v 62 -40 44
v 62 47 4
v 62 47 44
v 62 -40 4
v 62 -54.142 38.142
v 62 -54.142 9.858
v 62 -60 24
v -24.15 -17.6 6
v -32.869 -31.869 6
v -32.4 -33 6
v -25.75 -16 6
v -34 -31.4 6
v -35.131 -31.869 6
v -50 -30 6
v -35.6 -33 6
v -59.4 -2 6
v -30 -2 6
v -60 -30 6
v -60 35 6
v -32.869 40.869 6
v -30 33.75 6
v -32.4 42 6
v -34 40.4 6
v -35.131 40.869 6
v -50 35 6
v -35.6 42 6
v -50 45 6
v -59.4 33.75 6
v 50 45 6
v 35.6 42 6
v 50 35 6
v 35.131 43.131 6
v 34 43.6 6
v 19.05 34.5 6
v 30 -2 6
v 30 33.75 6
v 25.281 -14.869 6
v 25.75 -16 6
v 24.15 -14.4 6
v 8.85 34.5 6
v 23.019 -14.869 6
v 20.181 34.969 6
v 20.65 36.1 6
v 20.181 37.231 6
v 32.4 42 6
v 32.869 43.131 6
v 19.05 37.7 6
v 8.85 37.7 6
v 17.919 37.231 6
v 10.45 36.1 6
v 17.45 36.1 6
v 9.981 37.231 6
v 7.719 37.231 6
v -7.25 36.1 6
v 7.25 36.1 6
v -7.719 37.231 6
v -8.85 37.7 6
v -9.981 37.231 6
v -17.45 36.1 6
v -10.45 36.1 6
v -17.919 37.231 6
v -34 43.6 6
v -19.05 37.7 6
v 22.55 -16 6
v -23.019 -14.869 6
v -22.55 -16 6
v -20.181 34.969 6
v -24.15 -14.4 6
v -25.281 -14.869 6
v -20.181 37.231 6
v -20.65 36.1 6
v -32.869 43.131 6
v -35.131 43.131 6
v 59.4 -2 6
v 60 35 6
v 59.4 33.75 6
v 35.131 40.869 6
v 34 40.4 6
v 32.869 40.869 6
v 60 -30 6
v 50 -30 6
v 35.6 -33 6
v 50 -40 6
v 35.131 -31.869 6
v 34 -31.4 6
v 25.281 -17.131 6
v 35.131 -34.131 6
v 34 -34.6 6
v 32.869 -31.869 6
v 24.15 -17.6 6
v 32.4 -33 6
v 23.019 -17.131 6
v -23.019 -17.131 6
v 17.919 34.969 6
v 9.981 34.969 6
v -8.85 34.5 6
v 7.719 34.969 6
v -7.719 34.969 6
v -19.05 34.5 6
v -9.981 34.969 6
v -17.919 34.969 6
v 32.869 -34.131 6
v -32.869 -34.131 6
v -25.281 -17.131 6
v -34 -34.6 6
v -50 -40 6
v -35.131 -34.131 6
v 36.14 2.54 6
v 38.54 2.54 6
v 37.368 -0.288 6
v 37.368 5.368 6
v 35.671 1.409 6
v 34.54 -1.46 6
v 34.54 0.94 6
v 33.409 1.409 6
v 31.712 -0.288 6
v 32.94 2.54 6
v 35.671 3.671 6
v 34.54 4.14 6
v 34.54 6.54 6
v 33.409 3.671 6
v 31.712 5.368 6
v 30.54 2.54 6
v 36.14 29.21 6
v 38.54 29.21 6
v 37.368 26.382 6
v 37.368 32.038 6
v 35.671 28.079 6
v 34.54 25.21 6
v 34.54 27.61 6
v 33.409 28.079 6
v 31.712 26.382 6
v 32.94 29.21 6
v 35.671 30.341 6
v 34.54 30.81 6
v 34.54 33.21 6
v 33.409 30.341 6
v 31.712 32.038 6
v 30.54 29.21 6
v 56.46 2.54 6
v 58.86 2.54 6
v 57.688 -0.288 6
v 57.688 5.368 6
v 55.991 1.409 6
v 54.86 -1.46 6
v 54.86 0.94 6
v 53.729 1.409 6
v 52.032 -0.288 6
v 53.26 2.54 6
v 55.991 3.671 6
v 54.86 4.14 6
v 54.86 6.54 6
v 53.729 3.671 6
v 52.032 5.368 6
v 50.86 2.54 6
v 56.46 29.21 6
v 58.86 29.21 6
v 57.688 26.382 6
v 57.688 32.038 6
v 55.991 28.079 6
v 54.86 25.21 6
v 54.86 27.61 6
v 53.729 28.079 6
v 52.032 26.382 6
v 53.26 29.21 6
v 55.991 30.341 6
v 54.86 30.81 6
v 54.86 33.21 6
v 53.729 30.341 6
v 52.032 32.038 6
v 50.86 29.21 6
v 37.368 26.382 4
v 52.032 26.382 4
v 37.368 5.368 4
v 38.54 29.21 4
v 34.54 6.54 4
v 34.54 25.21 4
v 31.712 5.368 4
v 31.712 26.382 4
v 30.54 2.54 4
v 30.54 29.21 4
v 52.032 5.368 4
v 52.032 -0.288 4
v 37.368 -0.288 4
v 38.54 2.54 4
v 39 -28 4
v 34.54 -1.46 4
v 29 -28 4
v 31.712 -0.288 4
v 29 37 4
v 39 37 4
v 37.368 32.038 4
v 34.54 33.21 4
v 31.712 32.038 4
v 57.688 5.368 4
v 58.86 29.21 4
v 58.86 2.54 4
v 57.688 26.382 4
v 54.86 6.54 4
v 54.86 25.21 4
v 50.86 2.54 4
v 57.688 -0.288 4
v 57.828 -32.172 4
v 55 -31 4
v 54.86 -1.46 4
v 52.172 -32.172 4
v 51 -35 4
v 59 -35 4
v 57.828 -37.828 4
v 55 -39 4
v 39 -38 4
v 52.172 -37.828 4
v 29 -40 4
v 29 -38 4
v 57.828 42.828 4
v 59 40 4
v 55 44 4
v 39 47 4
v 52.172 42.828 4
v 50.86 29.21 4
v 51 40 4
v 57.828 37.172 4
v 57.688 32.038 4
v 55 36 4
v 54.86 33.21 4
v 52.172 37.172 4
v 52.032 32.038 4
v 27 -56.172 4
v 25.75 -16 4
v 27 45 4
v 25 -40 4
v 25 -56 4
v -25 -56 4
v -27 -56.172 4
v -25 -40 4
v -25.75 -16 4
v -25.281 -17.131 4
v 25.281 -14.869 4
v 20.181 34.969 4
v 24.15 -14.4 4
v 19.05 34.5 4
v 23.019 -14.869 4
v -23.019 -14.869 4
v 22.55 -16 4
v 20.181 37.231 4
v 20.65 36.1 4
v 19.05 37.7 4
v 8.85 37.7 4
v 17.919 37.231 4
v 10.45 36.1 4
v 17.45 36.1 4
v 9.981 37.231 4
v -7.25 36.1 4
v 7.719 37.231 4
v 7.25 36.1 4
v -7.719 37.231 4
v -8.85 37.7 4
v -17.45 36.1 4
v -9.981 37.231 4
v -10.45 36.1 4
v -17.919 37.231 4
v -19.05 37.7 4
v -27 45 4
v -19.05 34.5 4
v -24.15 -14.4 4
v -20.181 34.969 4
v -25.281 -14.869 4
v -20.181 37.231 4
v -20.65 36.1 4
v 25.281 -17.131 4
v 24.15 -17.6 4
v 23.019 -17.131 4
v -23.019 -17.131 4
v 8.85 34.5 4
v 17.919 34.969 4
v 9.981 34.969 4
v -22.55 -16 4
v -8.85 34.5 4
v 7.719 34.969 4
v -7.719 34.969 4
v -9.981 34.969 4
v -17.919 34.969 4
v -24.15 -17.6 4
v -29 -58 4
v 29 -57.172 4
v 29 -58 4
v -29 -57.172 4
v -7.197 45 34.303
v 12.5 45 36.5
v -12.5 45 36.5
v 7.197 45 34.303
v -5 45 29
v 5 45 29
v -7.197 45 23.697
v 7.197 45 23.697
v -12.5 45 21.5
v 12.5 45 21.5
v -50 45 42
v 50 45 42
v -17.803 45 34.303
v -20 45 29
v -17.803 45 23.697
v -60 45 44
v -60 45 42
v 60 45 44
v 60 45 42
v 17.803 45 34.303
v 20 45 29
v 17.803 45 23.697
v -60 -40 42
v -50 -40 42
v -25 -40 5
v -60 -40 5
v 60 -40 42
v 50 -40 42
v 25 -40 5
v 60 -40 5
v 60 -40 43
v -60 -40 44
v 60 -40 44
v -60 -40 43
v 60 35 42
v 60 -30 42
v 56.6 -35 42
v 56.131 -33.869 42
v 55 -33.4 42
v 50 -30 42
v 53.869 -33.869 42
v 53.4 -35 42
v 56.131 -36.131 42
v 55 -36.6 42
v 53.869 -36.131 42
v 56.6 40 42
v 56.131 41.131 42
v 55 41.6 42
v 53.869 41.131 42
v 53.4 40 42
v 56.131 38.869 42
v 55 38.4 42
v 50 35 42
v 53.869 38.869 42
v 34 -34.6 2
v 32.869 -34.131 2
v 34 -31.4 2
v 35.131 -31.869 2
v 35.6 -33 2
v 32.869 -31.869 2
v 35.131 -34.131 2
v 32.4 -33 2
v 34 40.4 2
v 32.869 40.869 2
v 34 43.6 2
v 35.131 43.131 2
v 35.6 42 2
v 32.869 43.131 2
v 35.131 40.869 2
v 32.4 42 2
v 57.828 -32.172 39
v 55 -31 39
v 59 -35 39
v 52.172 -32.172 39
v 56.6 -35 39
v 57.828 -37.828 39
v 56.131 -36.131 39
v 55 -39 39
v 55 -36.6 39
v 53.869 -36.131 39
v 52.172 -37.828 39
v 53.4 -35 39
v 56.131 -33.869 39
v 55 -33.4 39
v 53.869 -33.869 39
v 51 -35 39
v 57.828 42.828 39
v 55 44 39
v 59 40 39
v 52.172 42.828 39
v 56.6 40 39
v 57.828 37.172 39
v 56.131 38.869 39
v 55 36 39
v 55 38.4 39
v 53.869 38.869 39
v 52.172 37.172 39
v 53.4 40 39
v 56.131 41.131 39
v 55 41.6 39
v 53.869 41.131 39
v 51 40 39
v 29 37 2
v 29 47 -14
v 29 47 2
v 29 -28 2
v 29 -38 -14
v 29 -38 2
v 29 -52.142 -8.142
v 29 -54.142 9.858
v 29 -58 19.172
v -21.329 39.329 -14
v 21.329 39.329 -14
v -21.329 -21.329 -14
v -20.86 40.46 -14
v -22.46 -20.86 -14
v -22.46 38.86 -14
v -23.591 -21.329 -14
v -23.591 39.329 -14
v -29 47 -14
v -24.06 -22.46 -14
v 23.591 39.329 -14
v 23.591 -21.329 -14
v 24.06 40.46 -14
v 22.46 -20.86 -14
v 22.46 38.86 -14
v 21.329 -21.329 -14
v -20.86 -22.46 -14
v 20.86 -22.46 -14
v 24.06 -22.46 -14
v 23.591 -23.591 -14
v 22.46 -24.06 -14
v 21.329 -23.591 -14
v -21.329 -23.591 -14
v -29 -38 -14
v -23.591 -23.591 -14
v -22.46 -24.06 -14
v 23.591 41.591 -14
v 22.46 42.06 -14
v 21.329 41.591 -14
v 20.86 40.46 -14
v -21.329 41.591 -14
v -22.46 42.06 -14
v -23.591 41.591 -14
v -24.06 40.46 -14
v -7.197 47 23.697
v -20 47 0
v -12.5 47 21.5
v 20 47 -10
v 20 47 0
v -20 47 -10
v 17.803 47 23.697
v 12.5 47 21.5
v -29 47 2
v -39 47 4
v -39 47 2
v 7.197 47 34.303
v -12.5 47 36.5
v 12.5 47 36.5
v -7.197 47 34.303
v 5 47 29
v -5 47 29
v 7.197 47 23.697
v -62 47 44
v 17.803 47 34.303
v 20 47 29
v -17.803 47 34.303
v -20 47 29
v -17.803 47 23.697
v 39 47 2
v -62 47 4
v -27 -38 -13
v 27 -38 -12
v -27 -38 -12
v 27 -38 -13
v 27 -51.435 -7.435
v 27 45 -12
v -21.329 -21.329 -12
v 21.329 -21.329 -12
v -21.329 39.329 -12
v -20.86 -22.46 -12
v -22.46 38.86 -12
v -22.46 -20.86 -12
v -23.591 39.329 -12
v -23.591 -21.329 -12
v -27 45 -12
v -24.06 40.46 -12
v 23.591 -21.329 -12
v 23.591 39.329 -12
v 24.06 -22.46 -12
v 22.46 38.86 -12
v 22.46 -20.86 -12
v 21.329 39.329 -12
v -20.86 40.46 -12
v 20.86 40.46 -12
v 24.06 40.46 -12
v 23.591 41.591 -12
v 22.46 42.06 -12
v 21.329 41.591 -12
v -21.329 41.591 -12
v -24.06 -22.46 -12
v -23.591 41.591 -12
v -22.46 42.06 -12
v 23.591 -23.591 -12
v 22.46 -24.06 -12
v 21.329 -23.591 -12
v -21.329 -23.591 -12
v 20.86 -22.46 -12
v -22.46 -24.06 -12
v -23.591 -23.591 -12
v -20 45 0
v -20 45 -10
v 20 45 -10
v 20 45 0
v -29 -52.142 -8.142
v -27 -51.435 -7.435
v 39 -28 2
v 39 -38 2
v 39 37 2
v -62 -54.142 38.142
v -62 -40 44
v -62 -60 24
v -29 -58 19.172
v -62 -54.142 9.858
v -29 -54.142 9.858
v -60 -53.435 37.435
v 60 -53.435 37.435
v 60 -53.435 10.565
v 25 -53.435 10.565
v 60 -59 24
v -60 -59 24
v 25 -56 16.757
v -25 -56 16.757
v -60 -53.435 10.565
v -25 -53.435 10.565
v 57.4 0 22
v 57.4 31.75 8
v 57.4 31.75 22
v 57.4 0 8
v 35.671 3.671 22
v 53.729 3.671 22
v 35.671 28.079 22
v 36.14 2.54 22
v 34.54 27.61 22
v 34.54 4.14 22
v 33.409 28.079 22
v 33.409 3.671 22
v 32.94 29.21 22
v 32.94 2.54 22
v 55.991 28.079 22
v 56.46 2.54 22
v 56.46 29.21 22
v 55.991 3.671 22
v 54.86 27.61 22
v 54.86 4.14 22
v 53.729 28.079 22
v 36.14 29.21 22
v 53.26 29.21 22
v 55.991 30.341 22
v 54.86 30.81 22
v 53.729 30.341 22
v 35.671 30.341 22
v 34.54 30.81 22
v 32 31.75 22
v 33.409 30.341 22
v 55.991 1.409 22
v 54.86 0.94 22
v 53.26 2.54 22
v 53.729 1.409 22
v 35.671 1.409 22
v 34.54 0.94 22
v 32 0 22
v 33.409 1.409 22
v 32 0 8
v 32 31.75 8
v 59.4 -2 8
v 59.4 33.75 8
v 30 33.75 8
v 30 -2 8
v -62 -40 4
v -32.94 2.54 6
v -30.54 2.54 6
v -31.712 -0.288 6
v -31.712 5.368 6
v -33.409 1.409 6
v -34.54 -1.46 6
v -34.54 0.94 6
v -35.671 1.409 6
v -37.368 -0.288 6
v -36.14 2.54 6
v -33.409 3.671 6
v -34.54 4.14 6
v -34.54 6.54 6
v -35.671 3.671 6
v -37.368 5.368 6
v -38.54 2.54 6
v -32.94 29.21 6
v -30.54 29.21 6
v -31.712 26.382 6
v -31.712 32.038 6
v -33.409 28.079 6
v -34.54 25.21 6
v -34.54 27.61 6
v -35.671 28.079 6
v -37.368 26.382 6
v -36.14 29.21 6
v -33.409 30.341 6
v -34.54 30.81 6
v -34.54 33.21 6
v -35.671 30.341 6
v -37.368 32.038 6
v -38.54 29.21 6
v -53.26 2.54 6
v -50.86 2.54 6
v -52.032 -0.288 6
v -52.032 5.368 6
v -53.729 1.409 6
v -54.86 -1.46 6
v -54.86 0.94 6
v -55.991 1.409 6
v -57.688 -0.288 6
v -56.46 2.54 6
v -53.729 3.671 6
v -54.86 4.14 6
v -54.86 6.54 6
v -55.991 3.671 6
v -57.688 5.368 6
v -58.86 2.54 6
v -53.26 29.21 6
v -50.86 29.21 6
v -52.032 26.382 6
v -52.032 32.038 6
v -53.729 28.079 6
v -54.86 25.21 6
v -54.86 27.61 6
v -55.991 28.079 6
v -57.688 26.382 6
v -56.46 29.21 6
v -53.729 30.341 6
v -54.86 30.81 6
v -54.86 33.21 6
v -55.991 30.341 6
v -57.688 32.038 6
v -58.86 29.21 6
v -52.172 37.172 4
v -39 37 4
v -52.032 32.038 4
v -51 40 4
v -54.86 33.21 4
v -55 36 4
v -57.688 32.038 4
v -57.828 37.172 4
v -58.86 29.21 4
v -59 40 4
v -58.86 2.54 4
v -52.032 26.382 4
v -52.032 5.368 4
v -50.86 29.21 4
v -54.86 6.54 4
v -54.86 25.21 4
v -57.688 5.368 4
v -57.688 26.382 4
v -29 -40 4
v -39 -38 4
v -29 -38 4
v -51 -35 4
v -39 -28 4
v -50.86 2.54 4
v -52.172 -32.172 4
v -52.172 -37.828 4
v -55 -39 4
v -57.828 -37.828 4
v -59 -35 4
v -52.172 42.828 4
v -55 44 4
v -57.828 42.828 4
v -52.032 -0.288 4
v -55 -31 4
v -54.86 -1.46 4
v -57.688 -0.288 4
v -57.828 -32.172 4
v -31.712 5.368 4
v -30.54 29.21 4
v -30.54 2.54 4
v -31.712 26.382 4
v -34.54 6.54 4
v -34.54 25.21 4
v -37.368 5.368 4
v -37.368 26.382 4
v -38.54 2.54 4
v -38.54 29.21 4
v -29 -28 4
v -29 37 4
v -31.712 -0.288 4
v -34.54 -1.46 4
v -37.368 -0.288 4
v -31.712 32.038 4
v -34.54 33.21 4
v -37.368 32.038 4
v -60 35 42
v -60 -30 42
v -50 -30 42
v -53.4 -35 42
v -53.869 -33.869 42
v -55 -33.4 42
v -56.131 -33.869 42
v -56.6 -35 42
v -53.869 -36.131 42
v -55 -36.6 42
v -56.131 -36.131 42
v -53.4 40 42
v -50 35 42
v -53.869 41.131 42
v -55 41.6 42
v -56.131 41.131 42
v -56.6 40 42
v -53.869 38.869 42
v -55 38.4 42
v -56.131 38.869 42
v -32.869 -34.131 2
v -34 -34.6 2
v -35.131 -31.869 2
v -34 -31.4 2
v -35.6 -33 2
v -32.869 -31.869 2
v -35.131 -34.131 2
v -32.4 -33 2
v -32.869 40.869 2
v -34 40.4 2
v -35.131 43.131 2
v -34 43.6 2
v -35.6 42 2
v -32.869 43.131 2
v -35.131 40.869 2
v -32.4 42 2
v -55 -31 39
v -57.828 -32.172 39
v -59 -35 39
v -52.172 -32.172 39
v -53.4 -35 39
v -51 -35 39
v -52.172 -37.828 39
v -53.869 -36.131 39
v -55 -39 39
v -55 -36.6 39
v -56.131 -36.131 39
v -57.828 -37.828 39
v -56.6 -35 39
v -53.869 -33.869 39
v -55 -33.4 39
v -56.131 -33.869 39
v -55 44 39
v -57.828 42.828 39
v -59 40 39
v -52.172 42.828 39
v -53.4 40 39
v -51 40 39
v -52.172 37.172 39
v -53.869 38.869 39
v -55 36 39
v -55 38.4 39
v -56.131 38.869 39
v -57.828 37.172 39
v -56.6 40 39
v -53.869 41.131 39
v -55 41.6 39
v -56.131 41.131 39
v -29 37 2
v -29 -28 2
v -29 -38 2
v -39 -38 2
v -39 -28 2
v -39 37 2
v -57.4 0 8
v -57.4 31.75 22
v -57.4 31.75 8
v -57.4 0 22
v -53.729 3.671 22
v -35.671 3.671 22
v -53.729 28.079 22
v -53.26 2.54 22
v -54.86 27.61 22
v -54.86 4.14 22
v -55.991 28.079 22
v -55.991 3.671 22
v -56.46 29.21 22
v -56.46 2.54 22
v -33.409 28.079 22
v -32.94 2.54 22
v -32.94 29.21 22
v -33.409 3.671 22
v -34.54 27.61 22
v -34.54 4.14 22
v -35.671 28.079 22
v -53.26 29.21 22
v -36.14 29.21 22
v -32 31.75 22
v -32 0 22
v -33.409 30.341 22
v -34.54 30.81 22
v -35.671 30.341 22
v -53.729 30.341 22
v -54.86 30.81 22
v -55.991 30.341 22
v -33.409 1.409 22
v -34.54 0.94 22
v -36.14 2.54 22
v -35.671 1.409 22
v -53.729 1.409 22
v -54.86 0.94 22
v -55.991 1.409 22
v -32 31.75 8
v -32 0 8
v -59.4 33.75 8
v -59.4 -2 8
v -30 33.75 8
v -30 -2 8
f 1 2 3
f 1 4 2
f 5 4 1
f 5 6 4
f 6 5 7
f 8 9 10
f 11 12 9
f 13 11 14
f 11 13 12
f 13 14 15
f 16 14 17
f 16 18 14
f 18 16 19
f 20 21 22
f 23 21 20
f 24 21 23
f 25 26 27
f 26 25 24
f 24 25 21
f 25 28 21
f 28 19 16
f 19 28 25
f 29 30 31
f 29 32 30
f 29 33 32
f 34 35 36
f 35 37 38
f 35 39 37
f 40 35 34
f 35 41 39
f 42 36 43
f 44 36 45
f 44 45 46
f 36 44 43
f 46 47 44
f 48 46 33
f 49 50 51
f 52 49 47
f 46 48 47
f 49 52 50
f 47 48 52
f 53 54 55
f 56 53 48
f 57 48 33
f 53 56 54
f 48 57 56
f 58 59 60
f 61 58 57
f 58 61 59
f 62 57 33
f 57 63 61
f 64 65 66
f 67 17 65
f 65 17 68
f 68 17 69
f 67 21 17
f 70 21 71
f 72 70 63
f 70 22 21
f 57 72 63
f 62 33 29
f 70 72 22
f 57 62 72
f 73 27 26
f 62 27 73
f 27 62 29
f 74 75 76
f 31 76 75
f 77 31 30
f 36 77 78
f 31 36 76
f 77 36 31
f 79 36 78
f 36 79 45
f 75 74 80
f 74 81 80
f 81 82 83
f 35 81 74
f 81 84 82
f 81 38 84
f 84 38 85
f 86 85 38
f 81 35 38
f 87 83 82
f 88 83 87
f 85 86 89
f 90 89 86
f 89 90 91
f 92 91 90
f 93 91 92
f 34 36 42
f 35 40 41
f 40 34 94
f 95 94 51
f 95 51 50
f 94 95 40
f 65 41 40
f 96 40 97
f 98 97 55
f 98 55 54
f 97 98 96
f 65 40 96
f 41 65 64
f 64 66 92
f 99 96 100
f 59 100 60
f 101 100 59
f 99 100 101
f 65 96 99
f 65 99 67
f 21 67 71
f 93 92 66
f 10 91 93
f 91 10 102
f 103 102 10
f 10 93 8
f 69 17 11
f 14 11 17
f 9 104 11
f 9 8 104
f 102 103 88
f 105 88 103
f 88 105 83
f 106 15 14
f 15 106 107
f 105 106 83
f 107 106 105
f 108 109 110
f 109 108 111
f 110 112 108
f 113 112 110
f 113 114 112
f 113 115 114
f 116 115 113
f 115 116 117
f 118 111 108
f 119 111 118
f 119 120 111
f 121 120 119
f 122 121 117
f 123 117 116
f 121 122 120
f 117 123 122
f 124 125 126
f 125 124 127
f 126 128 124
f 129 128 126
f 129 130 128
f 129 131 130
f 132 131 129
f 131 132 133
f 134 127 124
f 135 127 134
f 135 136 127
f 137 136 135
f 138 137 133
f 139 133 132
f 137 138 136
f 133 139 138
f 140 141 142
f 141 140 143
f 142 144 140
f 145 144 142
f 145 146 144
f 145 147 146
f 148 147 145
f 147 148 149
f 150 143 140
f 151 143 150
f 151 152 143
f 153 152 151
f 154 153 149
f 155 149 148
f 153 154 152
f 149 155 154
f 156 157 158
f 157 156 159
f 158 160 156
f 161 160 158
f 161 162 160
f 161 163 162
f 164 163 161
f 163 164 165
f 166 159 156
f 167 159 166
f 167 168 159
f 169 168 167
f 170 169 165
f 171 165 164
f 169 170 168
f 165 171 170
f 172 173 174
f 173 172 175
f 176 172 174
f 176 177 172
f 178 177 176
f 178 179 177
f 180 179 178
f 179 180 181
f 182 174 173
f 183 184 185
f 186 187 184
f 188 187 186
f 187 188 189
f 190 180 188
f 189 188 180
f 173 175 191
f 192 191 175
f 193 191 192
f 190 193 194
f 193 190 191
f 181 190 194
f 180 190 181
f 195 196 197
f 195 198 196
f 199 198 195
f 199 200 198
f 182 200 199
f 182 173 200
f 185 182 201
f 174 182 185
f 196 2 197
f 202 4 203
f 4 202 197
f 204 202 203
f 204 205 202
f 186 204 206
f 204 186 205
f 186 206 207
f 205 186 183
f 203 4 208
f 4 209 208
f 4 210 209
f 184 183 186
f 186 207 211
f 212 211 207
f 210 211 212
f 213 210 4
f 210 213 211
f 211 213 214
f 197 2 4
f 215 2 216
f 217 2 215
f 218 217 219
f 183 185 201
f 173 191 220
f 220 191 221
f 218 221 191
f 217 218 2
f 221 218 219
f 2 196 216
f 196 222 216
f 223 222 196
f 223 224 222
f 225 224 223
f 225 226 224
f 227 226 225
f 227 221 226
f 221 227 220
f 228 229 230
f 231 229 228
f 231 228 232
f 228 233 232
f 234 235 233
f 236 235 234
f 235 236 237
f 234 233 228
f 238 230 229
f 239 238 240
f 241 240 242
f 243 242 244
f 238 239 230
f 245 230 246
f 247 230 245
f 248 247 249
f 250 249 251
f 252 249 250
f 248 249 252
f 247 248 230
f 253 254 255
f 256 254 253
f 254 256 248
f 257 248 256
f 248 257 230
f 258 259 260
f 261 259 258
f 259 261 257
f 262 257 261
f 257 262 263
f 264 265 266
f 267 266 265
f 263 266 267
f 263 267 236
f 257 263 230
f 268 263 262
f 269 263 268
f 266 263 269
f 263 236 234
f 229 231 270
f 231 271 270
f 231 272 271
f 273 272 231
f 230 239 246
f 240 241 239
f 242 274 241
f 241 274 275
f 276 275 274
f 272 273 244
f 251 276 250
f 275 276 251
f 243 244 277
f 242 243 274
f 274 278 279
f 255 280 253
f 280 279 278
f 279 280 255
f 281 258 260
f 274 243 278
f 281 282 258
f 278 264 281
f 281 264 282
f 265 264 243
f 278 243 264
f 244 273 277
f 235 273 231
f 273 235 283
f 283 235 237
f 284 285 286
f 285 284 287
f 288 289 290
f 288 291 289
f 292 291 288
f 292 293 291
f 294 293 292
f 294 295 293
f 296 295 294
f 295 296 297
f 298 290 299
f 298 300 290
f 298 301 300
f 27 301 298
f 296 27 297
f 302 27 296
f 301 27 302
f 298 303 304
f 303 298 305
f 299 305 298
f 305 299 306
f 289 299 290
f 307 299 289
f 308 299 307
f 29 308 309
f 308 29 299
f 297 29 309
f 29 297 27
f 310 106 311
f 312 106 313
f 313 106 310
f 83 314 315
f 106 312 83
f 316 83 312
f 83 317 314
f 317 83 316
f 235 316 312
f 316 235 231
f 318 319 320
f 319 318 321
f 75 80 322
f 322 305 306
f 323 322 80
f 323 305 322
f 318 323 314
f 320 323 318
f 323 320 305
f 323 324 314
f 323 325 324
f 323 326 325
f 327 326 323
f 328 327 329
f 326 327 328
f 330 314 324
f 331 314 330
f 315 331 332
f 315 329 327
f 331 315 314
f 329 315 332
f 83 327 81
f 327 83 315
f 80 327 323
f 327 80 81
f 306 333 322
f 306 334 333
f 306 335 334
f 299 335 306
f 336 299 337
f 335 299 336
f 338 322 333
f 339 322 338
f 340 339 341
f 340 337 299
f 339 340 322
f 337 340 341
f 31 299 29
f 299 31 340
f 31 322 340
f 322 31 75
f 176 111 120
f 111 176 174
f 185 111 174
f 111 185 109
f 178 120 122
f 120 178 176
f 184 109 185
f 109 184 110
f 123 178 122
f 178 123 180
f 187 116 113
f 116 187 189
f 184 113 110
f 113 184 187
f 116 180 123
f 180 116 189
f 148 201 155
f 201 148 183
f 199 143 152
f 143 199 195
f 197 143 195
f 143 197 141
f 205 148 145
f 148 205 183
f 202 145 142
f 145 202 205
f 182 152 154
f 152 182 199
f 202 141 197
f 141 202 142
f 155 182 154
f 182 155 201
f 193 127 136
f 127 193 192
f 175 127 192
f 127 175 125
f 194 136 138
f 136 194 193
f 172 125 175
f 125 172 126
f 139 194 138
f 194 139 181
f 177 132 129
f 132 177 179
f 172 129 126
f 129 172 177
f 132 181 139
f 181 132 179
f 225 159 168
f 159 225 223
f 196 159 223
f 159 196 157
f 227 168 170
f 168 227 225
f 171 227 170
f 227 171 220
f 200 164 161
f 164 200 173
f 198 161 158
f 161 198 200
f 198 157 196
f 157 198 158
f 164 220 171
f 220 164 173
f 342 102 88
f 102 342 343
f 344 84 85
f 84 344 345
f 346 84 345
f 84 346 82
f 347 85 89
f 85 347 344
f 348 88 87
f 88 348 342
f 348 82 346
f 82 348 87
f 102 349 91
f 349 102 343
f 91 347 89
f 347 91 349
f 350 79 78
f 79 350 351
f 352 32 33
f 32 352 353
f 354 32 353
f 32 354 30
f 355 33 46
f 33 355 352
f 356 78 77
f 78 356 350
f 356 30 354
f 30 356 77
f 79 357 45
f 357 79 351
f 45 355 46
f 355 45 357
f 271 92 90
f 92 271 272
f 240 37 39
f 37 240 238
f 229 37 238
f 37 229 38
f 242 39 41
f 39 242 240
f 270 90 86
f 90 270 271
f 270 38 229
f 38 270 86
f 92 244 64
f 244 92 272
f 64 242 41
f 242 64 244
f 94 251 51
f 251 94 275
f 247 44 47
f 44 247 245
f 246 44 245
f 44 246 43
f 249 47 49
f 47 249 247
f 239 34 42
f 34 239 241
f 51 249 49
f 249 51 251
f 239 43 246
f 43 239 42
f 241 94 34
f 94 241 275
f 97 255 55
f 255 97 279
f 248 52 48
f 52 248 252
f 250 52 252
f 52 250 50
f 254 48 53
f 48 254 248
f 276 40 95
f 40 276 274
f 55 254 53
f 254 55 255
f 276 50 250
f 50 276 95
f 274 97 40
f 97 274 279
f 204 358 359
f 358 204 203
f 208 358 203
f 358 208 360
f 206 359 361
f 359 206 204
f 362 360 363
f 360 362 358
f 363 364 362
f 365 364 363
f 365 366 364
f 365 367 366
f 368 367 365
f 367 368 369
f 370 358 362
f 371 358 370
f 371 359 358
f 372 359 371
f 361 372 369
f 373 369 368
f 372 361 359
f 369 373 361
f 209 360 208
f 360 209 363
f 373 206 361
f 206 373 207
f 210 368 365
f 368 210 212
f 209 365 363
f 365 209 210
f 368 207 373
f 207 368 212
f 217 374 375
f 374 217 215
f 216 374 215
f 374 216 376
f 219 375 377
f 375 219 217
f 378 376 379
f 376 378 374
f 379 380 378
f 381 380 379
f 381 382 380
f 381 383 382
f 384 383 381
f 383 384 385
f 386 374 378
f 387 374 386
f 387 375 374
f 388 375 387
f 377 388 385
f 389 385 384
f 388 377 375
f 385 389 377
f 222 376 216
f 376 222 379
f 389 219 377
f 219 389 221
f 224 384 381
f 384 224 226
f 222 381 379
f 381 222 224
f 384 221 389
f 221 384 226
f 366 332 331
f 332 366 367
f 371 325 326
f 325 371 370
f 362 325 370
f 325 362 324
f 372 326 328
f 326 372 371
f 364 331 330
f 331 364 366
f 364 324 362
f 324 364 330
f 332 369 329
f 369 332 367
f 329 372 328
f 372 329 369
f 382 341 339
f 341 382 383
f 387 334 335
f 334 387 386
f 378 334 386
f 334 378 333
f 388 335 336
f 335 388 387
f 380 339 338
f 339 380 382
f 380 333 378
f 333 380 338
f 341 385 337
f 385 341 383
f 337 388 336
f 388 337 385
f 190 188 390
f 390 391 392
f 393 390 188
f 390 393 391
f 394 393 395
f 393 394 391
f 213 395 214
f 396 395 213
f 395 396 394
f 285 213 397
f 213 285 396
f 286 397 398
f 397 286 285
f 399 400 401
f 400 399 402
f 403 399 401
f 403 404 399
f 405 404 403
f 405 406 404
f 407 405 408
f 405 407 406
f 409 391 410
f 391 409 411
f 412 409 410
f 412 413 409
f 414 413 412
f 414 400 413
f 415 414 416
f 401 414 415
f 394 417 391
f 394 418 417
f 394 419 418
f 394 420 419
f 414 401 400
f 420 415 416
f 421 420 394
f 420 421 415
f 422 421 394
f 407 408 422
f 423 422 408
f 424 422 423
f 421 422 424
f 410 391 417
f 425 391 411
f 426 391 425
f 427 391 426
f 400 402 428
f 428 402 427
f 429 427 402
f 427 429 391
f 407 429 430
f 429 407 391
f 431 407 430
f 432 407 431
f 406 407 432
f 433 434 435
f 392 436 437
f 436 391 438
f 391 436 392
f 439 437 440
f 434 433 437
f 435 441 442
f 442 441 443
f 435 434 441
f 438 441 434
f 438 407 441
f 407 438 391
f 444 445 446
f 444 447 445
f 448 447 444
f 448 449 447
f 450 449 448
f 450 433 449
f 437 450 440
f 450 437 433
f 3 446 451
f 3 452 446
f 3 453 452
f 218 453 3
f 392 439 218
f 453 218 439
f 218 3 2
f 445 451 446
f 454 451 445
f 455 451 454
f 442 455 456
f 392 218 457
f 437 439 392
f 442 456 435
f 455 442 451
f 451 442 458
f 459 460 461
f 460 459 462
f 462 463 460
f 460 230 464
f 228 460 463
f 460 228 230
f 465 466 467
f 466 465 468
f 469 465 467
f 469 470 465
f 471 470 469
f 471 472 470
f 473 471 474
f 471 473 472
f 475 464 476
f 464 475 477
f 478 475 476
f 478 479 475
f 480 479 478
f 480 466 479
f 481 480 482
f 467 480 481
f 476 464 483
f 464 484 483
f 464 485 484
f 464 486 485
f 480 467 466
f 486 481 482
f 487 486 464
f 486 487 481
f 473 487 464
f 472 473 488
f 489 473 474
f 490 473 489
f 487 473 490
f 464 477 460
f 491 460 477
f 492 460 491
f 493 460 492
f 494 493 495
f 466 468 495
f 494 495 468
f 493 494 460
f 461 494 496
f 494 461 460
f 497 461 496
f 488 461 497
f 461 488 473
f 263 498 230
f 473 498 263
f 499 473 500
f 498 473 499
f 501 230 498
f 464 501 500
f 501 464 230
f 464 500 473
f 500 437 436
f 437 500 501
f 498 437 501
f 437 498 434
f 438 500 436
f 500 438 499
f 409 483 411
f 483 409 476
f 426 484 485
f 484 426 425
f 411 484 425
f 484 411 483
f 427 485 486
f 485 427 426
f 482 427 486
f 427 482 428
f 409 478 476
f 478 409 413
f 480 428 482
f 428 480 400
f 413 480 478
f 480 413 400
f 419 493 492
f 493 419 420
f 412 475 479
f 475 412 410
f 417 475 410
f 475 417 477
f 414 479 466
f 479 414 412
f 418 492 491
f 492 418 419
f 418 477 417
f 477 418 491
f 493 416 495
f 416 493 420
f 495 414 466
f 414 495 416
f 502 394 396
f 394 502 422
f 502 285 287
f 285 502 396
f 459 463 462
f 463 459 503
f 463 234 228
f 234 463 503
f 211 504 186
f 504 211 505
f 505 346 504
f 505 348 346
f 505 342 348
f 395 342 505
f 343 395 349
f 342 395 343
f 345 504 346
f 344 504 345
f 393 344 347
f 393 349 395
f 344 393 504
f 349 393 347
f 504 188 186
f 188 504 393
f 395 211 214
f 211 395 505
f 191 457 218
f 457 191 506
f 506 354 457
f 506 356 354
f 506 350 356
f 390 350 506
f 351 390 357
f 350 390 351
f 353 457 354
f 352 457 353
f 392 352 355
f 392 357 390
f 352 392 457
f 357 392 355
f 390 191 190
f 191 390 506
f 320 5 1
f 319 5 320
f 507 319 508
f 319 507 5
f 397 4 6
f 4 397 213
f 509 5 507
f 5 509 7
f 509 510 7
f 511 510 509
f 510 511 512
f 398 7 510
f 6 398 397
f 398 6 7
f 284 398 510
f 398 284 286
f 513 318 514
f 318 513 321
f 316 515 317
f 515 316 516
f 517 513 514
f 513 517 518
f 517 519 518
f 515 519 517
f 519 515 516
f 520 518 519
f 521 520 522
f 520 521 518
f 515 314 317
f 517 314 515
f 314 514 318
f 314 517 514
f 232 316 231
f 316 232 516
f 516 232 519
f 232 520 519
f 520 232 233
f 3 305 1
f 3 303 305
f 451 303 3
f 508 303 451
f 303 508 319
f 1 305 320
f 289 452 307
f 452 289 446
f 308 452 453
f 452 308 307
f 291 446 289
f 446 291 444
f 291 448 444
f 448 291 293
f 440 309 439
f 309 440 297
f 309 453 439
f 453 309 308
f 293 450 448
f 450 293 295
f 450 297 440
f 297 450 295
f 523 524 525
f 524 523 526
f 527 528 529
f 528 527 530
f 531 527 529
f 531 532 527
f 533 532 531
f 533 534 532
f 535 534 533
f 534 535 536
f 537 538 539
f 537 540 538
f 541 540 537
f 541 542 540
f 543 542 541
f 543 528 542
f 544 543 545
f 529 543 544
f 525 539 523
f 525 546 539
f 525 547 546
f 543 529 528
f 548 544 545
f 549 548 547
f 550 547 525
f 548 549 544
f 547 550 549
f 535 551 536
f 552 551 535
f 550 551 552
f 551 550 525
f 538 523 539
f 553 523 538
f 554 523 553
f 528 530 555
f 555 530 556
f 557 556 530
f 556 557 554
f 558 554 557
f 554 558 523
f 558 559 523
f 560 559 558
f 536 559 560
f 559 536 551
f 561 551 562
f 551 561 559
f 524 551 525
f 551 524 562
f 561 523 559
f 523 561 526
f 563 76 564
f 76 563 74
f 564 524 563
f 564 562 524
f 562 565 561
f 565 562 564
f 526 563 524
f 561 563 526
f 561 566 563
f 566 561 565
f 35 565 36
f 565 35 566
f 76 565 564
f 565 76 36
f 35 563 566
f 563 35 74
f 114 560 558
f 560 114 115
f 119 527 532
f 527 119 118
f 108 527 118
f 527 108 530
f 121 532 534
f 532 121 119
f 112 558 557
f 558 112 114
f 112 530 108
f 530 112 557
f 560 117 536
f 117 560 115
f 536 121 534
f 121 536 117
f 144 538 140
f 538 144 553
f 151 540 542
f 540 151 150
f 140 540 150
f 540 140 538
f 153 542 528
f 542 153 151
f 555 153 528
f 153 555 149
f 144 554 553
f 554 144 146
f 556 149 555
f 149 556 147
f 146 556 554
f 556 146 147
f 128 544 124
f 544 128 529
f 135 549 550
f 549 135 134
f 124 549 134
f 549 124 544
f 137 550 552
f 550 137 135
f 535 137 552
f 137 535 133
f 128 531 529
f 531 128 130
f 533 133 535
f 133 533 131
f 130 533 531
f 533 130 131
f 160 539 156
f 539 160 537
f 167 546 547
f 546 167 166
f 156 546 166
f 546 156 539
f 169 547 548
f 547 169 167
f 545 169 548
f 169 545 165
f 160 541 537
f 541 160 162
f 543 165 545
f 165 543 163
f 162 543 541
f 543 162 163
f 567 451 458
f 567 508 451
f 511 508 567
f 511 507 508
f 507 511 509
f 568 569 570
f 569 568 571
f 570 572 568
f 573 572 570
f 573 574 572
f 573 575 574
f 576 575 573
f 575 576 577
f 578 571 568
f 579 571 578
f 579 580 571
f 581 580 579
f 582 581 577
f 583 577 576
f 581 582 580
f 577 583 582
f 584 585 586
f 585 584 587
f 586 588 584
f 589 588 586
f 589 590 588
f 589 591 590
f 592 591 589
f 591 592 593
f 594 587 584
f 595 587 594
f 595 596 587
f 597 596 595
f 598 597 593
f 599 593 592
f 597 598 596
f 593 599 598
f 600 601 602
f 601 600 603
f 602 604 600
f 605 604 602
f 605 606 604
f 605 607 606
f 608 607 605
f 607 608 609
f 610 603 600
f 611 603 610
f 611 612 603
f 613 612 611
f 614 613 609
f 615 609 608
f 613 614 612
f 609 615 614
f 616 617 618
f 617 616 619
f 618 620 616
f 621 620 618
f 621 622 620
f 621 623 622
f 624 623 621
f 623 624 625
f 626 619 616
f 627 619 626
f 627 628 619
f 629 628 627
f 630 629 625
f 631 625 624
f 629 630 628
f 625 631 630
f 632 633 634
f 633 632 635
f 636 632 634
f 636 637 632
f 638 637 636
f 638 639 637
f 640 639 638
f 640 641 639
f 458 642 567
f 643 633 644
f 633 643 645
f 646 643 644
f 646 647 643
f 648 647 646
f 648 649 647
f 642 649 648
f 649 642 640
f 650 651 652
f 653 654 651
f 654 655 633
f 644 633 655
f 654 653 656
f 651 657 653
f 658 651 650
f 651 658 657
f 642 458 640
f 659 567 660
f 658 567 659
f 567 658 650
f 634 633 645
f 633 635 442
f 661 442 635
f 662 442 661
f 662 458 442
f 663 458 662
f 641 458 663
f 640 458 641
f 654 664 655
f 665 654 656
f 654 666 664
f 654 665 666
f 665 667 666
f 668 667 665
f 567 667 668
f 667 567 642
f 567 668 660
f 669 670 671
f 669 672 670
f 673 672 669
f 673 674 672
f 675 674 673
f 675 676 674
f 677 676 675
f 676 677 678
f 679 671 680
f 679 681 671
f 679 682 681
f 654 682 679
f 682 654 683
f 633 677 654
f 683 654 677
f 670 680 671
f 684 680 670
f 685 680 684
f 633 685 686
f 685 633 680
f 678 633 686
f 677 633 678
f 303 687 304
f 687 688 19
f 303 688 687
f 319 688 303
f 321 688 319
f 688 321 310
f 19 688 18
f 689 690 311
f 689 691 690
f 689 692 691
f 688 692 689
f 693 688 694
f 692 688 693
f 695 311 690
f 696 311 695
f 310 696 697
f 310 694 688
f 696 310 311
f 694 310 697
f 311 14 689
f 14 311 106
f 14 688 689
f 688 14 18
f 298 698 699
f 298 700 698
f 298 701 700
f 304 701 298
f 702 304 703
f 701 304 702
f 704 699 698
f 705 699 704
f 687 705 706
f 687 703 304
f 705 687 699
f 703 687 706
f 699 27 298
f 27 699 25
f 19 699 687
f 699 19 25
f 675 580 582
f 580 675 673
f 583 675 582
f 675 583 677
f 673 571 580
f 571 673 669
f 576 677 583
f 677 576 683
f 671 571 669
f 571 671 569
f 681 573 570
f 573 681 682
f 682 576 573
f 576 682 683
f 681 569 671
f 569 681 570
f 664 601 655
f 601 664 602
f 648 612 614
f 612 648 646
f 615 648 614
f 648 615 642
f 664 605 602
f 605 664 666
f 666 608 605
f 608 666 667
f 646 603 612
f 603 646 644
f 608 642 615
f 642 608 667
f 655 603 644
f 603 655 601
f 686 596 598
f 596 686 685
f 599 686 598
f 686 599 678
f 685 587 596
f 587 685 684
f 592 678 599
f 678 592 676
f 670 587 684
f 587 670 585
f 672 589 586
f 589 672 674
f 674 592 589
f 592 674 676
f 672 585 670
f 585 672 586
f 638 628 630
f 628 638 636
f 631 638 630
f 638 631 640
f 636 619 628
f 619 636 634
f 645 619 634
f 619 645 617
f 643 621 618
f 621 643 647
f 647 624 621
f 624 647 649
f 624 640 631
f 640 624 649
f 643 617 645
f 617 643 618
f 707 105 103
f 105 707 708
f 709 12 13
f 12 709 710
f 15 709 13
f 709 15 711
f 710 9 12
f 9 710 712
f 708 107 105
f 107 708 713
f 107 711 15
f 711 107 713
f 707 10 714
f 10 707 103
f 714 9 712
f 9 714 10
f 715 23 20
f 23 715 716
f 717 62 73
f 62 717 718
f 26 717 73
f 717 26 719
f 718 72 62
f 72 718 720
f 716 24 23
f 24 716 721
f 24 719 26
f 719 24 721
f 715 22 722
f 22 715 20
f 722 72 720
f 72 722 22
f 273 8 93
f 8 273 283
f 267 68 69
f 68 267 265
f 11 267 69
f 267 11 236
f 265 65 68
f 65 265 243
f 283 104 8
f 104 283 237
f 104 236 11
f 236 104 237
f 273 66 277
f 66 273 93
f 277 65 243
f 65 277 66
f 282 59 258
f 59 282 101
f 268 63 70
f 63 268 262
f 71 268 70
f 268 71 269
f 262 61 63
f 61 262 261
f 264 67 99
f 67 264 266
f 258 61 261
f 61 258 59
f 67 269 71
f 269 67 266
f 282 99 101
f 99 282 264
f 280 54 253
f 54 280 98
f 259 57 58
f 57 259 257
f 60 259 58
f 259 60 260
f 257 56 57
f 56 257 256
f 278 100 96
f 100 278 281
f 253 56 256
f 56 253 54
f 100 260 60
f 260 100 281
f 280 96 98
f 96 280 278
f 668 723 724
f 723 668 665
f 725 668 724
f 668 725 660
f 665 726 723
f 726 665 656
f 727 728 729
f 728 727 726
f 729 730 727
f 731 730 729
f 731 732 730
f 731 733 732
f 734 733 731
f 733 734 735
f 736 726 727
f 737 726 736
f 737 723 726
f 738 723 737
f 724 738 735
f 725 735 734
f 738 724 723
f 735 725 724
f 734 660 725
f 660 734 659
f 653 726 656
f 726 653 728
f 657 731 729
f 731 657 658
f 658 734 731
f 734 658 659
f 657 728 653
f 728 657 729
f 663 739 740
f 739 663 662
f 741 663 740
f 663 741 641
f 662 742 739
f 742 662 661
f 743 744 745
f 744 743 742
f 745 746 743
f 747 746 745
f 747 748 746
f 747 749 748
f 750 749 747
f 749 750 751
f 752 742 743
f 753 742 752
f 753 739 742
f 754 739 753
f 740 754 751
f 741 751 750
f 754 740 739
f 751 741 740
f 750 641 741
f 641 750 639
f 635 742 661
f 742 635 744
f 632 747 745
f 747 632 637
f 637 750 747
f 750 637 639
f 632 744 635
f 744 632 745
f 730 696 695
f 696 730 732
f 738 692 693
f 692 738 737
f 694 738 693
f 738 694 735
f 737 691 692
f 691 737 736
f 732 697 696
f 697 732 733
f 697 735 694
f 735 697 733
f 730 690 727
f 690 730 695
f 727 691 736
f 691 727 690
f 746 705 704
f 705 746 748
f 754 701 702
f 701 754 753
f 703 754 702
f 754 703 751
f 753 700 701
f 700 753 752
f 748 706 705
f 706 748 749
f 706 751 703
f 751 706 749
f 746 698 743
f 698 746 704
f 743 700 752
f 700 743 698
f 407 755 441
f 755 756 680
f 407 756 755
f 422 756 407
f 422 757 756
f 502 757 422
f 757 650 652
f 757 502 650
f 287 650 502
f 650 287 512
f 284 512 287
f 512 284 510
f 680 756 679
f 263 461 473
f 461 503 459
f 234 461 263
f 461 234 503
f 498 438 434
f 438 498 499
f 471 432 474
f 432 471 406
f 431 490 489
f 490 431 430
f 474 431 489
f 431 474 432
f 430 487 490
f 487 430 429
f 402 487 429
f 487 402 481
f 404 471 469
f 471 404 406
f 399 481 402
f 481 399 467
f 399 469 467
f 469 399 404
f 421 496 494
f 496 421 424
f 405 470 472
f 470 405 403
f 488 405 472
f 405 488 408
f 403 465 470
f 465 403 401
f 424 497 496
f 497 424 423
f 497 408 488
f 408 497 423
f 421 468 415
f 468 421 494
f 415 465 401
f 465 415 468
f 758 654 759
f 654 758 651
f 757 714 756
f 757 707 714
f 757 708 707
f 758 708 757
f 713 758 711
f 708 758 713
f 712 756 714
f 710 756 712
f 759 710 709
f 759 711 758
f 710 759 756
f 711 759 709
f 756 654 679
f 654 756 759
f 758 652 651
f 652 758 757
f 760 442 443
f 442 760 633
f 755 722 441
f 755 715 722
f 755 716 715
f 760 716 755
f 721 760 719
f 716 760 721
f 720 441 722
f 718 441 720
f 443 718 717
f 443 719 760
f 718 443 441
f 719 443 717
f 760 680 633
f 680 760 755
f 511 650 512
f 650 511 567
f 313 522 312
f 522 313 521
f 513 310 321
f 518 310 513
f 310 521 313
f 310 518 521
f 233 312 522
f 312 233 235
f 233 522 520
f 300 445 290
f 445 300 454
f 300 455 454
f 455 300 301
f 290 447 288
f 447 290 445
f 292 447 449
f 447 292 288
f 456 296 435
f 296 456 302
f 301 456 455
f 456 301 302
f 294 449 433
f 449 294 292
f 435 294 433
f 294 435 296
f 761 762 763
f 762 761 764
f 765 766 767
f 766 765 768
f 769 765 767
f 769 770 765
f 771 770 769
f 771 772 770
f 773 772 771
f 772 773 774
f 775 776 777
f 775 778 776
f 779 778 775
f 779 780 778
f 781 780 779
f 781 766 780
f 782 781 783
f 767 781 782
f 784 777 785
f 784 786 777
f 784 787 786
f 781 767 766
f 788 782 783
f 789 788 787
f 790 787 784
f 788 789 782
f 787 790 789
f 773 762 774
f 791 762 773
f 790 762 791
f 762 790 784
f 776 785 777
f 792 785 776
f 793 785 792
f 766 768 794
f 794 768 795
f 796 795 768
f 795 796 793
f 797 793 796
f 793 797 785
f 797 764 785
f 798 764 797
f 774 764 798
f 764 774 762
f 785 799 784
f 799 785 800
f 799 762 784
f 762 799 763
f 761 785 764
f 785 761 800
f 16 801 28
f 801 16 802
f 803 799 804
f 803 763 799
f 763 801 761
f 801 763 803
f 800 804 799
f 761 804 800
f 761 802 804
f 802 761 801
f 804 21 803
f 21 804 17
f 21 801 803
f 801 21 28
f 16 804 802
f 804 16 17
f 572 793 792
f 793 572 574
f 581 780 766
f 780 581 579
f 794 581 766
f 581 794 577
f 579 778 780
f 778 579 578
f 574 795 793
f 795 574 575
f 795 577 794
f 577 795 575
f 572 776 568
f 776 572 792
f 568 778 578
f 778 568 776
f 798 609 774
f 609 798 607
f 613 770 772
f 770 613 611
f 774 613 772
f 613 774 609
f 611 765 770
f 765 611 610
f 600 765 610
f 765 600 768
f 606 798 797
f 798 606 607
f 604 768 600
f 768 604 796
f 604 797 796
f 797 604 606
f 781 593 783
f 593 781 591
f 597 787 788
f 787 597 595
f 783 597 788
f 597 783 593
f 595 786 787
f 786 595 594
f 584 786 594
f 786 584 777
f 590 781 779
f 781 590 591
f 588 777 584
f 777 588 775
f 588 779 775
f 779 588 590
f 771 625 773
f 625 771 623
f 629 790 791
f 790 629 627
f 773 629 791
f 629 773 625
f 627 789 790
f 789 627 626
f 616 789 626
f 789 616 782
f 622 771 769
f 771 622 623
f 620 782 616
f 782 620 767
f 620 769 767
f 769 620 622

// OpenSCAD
res = 8;
wallThickness = 2;

module JoyStick(){
    color("red"){
        difference(){
            cube([25.4, 31.75,1]);
            {
                translate([0,0,0.5]){
                    translate([2.54, 2.54, 0]){
                        cylinder(h=1, d=3.2, center=true, $fn=res);
                    }
                    translate([22.86,2.54 , 0]){
                        cylinder(h=1, d=3.2, center=true, $fn=res);
                    }
                    translate([2.54, 29.21, 0]){
                        cylinder(h=1, d=3.2, center=true, $fn=res);
                    }
                    translate([22.86, 29.21, 0]){
                        cylinder(h=1, d=3.2, center=true, $fn=res);
                    }
                }
                
            }
        }
    }
    color("DimGray"){
        translate([12.7, 17.78, 15.0/2+1]){
            cylinder(h=15, d=25.4, center=true, $fn=res);
            translate([0,0,(15.0+20.0)/2]){
                cylinder(h=20, d=20, center=true, $fn=res);
            }
        }
    }
}

module ArduinoStack(){
    difference(){
        color("blue"){
            cube([2.14*25.4*0.5, 2.77*25.4,32]);
        }
        
        translate([53.3/2 - 2.5, 14, 5]){
            cylinder(h=10, d=3.2, center=true, $fn=res);
        }
        translate([53.3/2 - (5.1+2.5), 14+1.3+50.8, 5]){
            cylinder(h=10, d=3.2, center=true, $fn=res);
        }
        translate([53.3/2 - 17.8, 14+1.3+50.8, 5]){
            cylinder(h=10, d=3.2, center=true, $fn=res);
        }
    }
    color("OrangeRed"){
        translate([0,0,32]){
            cube([50.2*0.5, 69.3,4]);
        }
    }
}

module BasePlate(){
    cube([62,85,wallThickness]);
}

module JoyStickCutout(){
    cylinder(h=wallThickness, d=25.4+2*wallThickness, center=true, $fn = res);
}

module Back(){
    rotate([0,90,0]){
        difference(){
            union(){
                cylinder(h=62, d=40, $fn=res);
                translate([0,-18,0]){
                    cube([20,20, 50/2 +2*wallThickness]);
                }
            }
            
            cylinder(h=62-wallThickness, d=40-wallThickness, $fn=res);
            translate([-25,0,0]){
                cube([50,25,62]);
            }
            translate([0,-18+wallThickness,0]){
                cube([20,20, 50/2]);
            }
        }
    }
}

module Side(){
    cube([wallThickness, 85, 40]);
}

module Front(){
    difference(){
        cube([62, wallThickness, 40]);
        translate([12.5,wallThickness/2,25]){
            rotate([90,0,0]){
                cylinder(h=wallThickness, d=15, center=true, $fn=res);
            }
        }
    }
}

module JoyStickMount(){
    difference(){
        union(){
            cube([25.4, 31.75,15+wallThickness/2]);
            translate([-wallThickness, -wallThickness, 0]){
                cube([25.4+2*wallThickness, 31.75+2*wallThickness,wallThickness]);
            }
        }
        
        translate([2.54, 2.54, (15+wallThickness/2)/2]){
            cylinder(h=15+wallThickness/2, d=3.2, center=true, $fn=res);
        }
        translate([22.86,2.54 , (15+wallThickness/2)/2]){
            cylinder(h=15+wallThickness/2, d=3.2, center=true, $fn=res);
        }
        translate([2.54, 29.21, (15+wallThickness/2)/2]){
            cylinder(h=15+wallThickness/2, d=3.2, center=true, $fn=res);
        }
        translate([22.86, 29.21, (15+wallThickness/2)/2]){
            cylinder(h=15+wallThickness/2, d=3.2, center=true, $fn=res);
        }
    }
}

module LipoBay(){
    difference(){
        cube([50/2 + 2*wallThickness, 85,10+4*wallThickness]);
        translate([0, 0, wallThickness]){
            cube([50/2 +wallThickness, 85-wallThickness,10+4*wallThickness]);
        }
        translate([0,85-wallThickness,wallThickness+2]){
            cube([20,wallThickness,10]);
        }
        translate([50/2-2.54,85-2.54-wallThickness*2,5]){
            cylinder(h=10, d=3.2, center=true, $fn=res);
        }
        translate([50/2-2.54,85-(68-2.54)-wallThickness*2,5]){
            cylinder(h=10, d=3.2, center=true, $fn=res);
        }
    }
    
    translate([0,0,20]){
        rotate([0,90,0]){
            intersection(){
                difference(){
                    cylinder(h=50/2 + 2*wallThickness, d=40, $fn=res);
                    cylinder(h=50/2 + wallThickness, d=40-wallThickness, $fn=res);
                }
                translate([wallThickness,-20,0]){
                    cube([20,20,50/2 + 2*wallThickness]);
                }
            }
            
        }
    }
    
    translate([50/2 + 2*wallThickness, 0, 10+3*wallThickness]){
        difference(){
            cube([10,10,wallThickness]);
            translate([5,5,wallThickness/2]){
                cylinder(h=wallThickness, d=3.2, center=true, $fn=res);
            }
        }
    }
    
    translate([50/2 + 2*wallThickness, 85-10, 10+3*wallThickness]){
        difference(){
            cube([10,10,wallThickness]);
            translate([5,5,wallThickness/2]){
                cylinder(h=wallThickness, d=3.2, center=true, $fn=res);
            }
        }
    }
}

module LipoCharger(){
    difference(){
        cube([50/2,68,10]);
        translate([50/2-2.54,2.54,5]){
            cylinder(h=10, d=3.2, center=true, $fn=res);
        }
        translate([50/2-2.54,68-2.54,5]){
            cylinder(h=10, d=3.2, center=true, $fn=res);
        }
    }
}

module RemoteHalf(){
    /*translate([0,-30,8]){
        ArduinoStack();
    }
    translate([32,0,20]){
        JoyStick();
    };
    
    translate([0,-29+2*wallThickness,-8]){
        color("blue"){
            LipoCharger();
        }
    }*/
    
    color("LightGrey"){
        // Top
        /*difference(){
            translate([0,-40,44-wallThickness]){
                BasePlate();
            }
            translate([32+25.4/2,17.78,wallThickness/2+44-wallThickness]){
                JoyStickCutout();
            }
            translate([0,-30-wallThickness,44-wallThickness]){
                cube([50.2*0.5+wallThickness, 69.3+wallThickness*2,4]);
            }
        
            translate([62-10-wallThickness+5,-40+5,44-wallThickness/2]){
                cylinder(h=20, d=3.2, center=true, $fn=res);
            }
            translate([62-10-wallThickness+5,85-10+5-40,44-wallThickness/2]){
                cylinder(h=wallThickness, d=3.2, center=true, $fn=res);
            }
        }*/
        
        // Bottom
        translate([0,-40,5-wallThickness/2]){
            difference(){
                union(){
                    BasePlate();
                    translate([62-10-wallThickness,0,0]){
                        cube([10,10,40-wallThickness]);
                    }
                    translate([62-10-wallThickness,85-10,0]){
                        cube([10,10,40-wallThickness]);
                    }
                }
                translate([50/2 + 2*wallThickness+5,5+wallThickness,wallThickness/2]){
                    cylinder(h=wallThickness, d=3.2, center=true, $fn=res);
                }
                translate([50/2 + 2*wallThickness+5,85-10+5+wallThickness,wallThickness/2]){
                    cylinder(h=wallThickness, d=3.2, center=true, $fn=res);
                }
                
                translate([53.3/2 - 2.5, 14+10, wallThickness/2]){
                    cylinder(h=wallThickness, d=3.2, center=true, $fn=res);
                }
                translate([53.3/2 - (5.1+2.5), 14+1.3+50.8 +10, wallThickness/2]){
                    cylinder(h=wallThickness, d=3.2, center=true, $fn=res);
                }
                translate([53.3/2 - 17.8, 14+1.3+50.8+10, wallThickness/2]){
                    cylinder(h=wallThickness, d=3.2, center=true, $fn=res);
                }
                translate([62-wallThickness-5,5,35/2]){
                    cylinder(h=35, d=8, center=true, $fn=res);
                }
                translate([62-wallThickness-5,85-10+5,35/2]){
                    cylinder(h=35, d=8, center=true, $fn=res);
                }
                translate([62-wallThickness-5,5,20]){
                    cylinder(h=40, d=3.2, center=true, $fn=res);
                }
                translate([62-wallThickness-5,85-10+5,20]){
                    cylinder(h=40, d=3.2, center=true, $fn=res);
                }
                translate([32,40,0]){
                    translate([2.54, 2.54, wallThickness/2]){
                        cylinder(h=wallThickness, d=8, center=true, $fn=res);
                    }
                    translate([22.86,2.54 , wallThickness/2]){
                        cylinder(h=wallThickness, d=8, center=true, $fn=res);
                    }
                    translate([2.54, 29.21, wallThickness/2]){
                        cylinder(h=wallThickness, d=8, center=true, $fn=res);
                    }
                    translate([22.86, 29.21, wallThickness/2]){
                        cylinder(h=wallThickness, d=8, center=true, $fn=res);
                    }
                }
            }
        }
        
        translate([0,-38,-15+wallThickness/2]){
            LipoBay();
        }
        
        translate([0,-40,25-wallThickness/2]){
            Back();
        }
        translate([62-wallThickness,-40,5-wallThickness/2]){
            Side();
        }
        
        translate([0,-40+85, 5-wallThickness/2]){
            Front();
        }
        
        translate([32,0,5+wallThickness/2]){
            JoyStickMount();
        }
    }
}

RemoteHalf();
mirror([1,0,0]){
    RemoteHalf();
}
